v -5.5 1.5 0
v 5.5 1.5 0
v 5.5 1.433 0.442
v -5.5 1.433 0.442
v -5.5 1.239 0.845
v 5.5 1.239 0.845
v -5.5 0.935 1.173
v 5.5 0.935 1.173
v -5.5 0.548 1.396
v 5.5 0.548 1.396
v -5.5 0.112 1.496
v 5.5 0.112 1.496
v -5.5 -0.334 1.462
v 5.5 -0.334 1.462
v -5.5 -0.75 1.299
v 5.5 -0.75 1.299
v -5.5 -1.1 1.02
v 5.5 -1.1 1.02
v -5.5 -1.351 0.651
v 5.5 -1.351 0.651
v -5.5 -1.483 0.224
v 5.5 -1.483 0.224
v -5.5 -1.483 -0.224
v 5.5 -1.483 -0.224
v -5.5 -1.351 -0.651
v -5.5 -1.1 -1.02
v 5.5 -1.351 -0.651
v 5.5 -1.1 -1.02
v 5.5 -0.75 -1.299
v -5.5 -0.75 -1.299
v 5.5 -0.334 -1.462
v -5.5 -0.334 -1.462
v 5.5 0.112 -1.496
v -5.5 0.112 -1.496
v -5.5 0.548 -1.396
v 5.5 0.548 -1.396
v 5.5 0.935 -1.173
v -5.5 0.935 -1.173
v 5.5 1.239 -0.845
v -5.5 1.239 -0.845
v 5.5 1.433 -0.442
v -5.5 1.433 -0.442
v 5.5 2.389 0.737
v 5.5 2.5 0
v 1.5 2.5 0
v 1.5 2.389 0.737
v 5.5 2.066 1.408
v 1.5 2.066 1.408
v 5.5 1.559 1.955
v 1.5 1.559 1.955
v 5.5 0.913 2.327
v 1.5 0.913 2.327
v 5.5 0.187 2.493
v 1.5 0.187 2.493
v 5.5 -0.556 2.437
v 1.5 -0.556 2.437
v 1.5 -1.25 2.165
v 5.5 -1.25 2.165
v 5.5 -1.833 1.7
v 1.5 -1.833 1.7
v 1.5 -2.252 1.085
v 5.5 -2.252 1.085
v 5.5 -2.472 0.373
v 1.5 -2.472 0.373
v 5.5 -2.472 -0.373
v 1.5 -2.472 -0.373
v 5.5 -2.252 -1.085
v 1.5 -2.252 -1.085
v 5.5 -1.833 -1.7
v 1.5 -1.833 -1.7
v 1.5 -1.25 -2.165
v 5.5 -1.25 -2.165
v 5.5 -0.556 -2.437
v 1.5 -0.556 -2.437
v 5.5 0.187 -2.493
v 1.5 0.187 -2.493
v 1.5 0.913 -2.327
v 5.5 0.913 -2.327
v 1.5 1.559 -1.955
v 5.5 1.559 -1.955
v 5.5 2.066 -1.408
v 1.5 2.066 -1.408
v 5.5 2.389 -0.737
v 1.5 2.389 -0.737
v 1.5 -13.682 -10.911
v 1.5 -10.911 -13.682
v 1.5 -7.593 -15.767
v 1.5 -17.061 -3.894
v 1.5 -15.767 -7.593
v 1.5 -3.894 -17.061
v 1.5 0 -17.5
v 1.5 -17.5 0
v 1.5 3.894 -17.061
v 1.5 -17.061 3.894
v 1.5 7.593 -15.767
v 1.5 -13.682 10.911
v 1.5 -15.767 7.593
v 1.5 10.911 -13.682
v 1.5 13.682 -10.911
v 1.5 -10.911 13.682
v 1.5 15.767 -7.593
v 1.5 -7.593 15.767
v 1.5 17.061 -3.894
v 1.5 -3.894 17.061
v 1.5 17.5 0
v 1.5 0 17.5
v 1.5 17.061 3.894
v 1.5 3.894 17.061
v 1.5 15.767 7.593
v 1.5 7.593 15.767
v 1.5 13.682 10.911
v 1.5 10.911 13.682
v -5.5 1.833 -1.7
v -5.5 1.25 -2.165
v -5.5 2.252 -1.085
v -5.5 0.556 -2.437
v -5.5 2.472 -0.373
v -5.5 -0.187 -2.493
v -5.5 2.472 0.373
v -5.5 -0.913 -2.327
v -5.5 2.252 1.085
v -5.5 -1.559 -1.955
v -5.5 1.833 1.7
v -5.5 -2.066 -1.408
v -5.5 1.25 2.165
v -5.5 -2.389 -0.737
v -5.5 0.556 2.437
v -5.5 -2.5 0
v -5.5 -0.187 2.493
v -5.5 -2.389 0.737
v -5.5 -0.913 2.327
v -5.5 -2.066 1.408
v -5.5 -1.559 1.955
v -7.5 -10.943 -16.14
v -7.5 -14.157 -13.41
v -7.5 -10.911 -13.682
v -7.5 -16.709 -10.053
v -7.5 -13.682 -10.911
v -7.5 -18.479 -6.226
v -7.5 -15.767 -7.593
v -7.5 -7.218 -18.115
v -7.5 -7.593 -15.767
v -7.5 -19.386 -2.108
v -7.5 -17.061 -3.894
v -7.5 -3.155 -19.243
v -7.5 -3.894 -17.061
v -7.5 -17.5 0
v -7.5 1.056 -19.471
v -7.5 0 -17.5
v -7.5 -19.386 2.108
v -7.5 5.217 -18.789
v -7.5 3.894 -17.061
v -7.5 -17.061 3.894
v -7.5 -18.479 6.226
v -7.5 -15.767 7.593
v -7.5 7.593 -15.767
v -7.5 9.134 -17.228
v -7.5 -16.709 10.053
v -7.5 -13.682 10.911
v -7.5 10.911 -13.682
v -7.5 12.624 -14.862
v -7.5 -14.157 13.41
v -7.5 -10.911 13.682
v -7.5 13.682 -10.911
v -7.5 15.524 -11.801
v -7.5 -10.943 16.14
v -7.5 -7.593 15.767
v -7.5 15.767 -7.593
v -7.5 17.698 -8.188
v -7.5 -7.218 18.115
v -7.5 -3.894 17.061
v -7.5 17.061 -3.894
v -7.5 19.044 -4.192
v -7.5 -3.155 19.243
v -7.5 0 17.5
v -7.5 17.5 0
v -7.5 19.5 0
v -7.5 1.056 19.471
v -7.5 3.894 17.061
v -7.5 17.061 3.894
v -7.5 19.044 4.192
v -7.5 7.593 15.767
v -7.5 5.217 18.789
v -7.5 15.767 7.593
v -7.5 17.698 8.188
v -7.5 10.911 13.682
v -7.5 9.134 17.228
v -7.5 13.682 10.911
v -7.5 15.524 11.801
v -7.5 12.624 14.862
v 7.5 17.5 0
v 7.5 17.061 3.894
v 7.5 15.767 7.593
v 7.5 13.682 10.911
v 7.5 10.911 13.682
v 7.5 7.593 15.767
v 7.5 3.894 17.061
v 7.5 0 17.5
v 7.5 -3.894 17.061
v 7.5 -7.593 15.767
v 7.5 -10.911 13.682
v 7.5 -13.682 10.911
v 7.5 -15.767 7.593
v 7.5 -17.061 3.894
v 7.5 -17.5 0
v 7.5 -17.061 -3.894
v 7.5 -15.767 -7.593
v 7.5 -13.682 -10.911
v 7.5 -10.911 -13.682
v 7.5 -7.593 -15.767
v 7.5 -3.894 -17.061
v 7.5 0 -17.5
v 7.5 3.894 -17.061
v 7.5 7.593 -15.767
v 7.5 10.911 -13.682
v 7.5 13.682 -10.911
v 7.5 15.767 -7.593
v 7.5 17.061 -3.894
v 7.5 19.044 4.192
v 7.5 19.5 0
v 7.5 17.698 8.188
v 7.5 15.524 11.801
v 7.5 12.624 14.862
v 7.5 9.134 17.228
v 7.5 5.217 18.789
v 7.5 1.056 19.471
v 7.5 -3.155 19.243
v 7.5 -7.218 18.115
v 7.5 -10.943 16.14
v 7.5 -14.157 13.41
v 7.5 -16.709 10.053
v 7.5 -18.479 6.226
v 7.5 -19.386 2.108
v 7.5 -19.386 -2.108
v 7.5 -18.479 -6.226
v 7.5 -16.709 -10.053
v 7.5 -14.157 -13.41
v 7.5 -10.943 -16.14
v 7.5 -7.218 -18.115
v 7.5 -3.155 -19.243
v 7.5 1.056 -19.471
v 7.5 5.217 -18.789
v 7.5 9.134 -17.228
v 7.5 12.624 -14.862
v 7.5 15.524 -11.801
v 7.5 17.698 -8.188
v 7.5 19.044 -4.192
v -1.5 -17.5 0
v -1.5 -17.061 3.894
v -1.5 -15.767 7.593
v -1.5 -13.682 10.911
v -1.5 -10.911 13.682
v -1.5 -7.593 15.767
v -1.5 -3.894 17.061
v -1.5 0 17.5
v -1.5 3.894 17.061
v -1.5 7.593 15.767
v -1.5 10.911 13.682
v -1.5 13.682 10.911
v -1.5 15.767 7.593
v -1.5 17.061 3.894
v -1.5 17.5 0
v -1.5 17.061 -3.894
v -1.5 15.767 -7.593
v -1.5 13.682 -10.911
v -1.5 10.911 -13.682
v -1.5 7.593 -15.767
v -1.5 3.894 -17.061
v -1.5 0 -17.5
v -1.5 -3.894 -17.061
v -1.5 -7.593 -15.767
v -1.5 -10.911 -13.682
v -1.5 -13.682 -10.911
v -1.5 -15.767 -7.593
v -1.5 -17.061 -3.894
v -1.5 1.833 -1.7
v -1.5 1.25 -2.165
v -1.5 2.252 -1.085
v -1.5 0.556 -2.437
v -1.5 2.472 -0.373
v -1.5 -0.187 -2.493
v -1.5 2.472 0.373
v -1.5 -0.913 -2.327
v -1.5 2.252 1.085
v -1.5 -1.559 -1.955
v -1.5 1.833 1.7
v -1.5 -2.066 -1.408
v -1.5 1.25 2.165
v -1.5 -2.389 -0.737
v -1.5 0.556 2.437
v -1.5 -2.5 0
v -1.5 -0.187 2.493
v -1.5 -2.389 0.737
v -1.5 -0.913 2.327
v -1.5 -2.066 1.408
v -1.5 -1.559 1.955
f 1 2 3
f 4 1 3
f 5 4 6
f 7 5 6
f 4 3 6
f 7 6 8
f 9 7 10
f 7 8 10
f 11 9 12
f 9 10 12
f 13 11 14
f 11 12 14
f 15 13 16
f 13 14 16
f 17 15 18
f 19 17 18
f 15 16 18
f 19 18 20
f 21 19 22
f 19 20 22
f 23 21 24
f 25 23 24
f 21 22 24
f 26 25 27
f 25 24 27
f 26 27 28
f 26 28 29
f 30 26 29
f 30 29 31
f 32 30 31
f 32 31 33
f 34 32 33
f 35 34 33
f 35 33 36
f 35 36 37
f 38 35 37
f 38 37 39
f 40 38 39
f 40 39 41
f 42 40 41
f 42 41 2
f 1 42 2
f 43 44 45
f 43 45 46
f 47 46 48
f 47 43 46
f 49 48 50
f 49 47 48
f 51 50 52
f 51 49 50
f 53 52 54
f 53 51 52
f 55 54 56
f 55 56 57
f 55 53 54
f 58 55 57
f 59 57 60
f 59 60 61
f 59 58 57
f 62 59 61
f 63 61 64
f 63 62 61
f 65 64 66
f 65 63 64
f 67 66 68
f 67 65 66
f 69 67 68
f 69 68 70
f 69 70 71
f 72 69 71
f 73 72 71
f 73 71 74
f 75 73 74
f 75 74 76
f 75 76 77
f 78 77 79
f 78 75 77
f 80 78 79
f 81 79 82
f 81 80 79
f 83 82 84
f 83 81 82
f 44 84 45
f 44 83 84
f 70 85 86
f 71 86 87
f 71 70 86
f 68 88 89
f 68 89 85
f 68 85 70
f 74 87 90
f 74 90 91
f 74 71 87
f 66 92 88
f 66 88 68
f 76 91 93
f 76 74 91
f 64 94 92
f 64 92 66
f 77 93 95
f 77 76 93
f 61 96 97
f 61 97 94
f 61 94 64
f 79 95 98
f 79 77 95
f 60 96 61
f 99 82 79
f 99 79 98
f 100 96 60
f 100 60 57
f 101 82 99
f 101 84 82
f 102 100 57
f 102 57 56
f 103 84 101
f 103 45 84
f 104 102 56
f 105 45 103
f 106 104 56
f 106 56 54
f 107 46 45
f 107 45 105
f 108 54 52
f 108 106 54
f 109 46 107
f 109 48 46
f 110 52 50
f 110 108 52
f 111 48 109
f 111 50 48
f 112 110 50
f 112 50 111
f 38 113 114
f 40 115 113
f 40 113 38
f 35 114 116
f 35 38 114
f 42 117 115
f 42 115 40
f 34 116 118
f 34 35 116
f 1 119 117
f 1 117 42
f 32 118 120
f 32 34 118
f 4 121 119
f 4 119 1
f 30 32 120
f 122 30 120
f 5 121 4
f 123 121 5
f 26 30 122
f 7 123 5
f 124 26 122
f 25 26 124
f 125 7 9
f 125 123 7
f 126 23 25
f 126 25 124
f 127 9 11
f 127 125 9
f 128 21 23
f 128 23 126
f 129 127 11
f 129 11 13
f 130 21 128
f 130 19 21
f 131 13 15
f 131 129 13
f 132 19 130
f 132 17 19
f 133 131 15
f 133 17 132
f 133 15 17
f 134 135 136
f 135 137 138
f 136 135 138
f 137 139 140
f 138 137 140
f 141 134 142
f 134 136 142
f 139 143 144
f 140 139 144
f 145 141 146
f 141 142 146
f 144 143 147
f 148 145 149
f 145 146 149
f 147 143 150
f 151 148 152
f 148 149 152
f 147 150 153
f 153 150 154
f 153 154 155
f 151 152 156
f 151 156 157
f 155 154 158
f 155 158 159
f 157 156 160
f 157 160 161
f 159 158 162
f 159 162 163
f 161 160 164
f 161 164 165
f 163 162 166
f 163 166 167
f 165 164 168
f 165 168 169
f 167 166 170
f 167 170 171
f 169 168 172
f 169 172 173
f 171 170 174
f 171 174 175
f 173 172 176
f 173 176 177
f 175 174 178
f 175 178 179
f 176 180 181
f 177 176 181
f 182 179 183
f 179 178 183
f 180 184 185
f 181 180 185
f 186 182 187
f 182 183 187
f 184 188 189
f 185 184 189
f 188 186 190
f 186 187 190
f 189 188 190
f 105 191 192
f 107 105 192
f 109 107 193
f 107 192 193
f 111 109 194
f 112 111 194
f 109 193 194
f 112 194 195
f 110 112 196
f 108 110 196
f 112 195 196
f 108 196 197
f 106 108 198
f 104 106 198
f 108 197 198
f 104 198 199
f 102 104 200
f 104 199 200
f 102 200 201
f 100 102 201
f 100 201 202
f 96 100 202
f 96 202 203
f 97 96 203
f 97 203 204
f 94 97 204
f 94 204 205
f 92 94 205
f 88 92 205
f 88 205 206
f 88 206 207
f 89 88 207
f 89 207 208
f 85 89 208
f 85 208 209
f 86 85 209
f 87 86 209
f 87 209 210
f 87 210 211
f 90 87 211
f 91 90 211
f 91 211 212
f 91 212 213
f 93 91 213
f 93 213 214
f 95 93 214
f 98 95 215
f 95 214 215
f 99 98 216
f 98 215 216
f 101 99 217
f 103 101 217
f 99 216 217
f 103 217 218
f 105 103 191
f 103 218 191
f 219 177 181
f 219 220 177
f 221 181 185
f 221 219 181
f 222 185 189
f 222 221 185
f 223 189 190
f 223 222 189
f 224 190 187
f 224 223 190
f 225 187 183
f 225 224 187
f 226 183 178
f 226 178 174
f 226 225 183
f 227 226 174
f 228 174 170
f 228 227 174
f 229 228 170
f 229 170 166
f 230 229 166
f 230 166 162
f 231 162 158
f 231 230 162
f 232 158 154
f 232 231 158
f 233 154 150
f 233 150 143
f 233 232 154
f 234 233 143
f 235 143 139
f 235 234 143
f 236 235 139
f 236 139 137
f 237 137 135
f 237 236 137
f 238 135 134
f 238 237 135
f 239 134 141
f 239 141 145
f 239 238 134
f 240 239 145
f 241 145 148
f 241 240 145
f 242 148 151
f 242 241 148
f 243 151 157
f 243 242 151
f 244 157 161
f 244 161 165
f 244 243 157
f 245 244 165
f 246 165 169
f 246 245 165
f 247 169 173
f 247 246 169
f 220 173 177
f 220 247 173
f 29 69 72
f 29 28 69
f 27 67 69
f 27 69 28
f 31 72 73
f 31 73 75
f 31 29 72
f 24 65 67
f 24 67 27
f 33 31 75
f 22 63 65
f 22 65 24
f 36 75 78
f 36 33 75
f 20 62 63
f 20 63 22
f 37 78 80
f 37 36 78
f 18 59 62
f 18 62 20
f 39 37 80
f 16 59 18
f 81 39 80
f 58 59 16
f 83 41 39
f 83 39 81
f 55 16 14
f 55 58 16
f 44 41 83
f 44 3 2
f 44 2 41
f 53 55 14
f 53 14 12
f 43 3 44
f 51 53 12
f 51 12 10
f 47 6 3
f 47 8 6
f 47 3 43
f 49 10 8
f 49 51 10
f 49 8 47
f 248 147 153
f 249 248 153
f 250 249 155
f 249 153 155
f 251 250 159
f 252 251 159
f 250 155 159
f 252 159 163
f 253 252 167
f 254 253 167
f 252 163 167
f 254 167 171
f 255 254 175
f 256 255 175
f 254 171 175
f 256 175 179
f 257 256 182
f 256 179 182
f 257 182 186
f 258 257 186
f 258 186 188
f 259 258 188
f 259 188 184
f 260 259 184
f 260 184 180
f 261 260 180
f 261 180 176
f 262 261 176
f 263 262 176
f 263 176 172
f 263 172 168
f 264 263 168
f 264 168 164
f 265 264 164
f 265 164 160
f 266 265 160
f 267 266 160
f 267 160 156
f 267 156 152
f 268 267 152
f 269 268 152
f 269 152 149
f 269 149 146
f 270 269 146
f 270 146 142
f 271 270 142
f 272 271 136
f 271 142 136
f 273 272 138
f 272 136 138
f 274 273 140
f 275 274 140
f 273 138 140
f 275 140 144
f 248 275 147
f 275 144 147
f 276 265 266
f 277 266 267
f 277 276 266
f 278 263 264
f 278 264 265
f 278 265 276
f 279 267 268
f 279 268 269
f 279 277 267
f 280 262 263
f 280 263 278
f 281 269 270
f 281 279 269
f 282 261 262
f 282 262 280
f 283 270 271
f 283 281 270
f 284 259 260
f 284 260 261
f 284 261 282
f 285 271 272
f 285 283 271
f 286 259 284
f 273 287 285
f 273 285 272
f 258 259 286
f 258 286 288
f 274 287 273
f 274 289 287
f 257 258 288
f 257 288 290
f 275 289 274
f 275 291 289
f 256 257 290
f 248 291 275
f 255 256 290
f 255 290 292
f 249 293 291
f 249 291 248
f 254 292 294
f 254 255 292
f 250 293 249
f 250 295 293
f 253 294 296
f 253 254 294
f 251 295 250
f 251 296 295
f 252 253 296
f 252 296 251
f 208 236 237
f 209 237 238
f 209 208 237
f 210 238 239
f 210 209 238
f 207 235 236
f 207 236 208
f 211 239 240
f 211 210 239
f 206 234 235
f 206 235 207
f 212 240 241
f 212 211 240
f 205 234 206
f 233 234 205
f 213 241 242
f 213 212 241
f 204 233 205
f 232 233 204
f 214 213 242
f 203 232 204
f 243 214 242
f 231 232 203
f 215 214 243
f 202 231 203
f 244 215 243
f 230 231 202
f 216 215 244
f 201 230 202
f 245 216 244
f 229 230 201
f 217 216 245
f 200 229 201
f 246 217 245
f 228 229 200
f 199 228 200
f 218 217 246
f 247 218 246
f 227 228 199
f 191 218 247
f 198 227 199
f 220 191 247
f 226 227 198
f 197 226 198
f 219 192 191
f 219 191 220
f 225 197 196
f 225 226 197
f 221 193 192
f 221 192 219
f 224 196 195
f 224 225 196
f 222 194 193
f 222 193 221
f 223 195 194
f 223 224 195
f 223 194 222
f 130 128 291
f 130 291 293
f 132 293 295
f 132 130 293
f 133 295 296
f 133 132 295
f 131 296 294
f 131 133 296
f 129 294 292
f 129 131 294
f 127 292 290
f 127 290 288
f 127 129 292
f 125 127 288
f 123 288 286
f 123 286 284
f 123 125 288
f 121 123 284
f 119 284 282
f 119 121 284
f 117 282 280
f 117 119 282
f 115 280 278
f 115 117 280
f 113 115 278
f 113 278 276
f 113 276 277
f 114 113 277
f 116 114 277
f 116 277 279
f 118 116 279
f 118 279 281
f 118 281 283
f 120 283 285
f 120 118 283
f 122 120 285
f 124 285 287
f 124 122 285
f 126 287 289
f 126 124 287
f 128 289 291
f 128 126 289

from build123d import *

# Parameters (mm, degrees)
F0_R      = 19.5
F1_DEPTH  = 7.5
F3_R      = 17.5
F4_DEPTH  = 2
F2_R      = 17.5
F5_DEPTH  = 2
F6_R      = 1.5
F7_DEPTH  = 25
F8_R      = 17.5
F8_R_2    = 2.5
F9_DEPTH  = 4
F10_R     = 17.5
F10_R_2   = 2.5
F11_DEPTH = 4


with BuildPart() as f1:
    # F0 (on Right) → F1 (new body, symmetric)
    with BuildSketch(Plane.YZ):
        Circle(F0_R)
    extrude(amount=F1_DEPTH, both=True)

    # F3 (on face) → F4 (cut)
    with BuildSketch(Plane(origin=(-7.5, 0, 0), x_dir=(0, -1, 0), z_dir=(-1, 0, 0))):
        Circle(F3_R)
    extrude(amount=-F4_DEPTH, mode=Mode.SUBTRACT)

    # F2 (on face) → F5 (cut)
    with BuildSketch(Plane.YZ.offset(7.5)):
        Circle(F2_R)
    extrude(amount=-F5_DEPTH, mode=Mode.SUBTRACT)

    # F6 (on face) → F7 (cut)
    with BuildSketch(Plane.YZ.offset(5.5)):
        Circle(F6_R)
    extrude(amount=-F7_DEPTH, mode=Mode.SUBTRACT)

    # F8 (on face) → F9 (cut)
    with BuildSketch(Plane.YZ.offset(5.5)):
        Circle(F8_R)
        Circle(F8_R_2, mode=Mode.SUBTRACT)
    extrude(amount=-F9_DEPTH, mode=Mode.SUBTRACT)

    # F10 (on face) → F11 (cut)
    with BuildSketch(Plane(origin=(-5.5, 0, 0), x_dir=(0, -1, 0), z_dir=(-1, 0, 0))):
        Circle(F10_R)
        Circle(F10_R_2, mode=Mode.SUBTRACT)
    extrude(amount=-F11_DEPTH, mode=Mode.SUBTRACT)


solid = f1.part
